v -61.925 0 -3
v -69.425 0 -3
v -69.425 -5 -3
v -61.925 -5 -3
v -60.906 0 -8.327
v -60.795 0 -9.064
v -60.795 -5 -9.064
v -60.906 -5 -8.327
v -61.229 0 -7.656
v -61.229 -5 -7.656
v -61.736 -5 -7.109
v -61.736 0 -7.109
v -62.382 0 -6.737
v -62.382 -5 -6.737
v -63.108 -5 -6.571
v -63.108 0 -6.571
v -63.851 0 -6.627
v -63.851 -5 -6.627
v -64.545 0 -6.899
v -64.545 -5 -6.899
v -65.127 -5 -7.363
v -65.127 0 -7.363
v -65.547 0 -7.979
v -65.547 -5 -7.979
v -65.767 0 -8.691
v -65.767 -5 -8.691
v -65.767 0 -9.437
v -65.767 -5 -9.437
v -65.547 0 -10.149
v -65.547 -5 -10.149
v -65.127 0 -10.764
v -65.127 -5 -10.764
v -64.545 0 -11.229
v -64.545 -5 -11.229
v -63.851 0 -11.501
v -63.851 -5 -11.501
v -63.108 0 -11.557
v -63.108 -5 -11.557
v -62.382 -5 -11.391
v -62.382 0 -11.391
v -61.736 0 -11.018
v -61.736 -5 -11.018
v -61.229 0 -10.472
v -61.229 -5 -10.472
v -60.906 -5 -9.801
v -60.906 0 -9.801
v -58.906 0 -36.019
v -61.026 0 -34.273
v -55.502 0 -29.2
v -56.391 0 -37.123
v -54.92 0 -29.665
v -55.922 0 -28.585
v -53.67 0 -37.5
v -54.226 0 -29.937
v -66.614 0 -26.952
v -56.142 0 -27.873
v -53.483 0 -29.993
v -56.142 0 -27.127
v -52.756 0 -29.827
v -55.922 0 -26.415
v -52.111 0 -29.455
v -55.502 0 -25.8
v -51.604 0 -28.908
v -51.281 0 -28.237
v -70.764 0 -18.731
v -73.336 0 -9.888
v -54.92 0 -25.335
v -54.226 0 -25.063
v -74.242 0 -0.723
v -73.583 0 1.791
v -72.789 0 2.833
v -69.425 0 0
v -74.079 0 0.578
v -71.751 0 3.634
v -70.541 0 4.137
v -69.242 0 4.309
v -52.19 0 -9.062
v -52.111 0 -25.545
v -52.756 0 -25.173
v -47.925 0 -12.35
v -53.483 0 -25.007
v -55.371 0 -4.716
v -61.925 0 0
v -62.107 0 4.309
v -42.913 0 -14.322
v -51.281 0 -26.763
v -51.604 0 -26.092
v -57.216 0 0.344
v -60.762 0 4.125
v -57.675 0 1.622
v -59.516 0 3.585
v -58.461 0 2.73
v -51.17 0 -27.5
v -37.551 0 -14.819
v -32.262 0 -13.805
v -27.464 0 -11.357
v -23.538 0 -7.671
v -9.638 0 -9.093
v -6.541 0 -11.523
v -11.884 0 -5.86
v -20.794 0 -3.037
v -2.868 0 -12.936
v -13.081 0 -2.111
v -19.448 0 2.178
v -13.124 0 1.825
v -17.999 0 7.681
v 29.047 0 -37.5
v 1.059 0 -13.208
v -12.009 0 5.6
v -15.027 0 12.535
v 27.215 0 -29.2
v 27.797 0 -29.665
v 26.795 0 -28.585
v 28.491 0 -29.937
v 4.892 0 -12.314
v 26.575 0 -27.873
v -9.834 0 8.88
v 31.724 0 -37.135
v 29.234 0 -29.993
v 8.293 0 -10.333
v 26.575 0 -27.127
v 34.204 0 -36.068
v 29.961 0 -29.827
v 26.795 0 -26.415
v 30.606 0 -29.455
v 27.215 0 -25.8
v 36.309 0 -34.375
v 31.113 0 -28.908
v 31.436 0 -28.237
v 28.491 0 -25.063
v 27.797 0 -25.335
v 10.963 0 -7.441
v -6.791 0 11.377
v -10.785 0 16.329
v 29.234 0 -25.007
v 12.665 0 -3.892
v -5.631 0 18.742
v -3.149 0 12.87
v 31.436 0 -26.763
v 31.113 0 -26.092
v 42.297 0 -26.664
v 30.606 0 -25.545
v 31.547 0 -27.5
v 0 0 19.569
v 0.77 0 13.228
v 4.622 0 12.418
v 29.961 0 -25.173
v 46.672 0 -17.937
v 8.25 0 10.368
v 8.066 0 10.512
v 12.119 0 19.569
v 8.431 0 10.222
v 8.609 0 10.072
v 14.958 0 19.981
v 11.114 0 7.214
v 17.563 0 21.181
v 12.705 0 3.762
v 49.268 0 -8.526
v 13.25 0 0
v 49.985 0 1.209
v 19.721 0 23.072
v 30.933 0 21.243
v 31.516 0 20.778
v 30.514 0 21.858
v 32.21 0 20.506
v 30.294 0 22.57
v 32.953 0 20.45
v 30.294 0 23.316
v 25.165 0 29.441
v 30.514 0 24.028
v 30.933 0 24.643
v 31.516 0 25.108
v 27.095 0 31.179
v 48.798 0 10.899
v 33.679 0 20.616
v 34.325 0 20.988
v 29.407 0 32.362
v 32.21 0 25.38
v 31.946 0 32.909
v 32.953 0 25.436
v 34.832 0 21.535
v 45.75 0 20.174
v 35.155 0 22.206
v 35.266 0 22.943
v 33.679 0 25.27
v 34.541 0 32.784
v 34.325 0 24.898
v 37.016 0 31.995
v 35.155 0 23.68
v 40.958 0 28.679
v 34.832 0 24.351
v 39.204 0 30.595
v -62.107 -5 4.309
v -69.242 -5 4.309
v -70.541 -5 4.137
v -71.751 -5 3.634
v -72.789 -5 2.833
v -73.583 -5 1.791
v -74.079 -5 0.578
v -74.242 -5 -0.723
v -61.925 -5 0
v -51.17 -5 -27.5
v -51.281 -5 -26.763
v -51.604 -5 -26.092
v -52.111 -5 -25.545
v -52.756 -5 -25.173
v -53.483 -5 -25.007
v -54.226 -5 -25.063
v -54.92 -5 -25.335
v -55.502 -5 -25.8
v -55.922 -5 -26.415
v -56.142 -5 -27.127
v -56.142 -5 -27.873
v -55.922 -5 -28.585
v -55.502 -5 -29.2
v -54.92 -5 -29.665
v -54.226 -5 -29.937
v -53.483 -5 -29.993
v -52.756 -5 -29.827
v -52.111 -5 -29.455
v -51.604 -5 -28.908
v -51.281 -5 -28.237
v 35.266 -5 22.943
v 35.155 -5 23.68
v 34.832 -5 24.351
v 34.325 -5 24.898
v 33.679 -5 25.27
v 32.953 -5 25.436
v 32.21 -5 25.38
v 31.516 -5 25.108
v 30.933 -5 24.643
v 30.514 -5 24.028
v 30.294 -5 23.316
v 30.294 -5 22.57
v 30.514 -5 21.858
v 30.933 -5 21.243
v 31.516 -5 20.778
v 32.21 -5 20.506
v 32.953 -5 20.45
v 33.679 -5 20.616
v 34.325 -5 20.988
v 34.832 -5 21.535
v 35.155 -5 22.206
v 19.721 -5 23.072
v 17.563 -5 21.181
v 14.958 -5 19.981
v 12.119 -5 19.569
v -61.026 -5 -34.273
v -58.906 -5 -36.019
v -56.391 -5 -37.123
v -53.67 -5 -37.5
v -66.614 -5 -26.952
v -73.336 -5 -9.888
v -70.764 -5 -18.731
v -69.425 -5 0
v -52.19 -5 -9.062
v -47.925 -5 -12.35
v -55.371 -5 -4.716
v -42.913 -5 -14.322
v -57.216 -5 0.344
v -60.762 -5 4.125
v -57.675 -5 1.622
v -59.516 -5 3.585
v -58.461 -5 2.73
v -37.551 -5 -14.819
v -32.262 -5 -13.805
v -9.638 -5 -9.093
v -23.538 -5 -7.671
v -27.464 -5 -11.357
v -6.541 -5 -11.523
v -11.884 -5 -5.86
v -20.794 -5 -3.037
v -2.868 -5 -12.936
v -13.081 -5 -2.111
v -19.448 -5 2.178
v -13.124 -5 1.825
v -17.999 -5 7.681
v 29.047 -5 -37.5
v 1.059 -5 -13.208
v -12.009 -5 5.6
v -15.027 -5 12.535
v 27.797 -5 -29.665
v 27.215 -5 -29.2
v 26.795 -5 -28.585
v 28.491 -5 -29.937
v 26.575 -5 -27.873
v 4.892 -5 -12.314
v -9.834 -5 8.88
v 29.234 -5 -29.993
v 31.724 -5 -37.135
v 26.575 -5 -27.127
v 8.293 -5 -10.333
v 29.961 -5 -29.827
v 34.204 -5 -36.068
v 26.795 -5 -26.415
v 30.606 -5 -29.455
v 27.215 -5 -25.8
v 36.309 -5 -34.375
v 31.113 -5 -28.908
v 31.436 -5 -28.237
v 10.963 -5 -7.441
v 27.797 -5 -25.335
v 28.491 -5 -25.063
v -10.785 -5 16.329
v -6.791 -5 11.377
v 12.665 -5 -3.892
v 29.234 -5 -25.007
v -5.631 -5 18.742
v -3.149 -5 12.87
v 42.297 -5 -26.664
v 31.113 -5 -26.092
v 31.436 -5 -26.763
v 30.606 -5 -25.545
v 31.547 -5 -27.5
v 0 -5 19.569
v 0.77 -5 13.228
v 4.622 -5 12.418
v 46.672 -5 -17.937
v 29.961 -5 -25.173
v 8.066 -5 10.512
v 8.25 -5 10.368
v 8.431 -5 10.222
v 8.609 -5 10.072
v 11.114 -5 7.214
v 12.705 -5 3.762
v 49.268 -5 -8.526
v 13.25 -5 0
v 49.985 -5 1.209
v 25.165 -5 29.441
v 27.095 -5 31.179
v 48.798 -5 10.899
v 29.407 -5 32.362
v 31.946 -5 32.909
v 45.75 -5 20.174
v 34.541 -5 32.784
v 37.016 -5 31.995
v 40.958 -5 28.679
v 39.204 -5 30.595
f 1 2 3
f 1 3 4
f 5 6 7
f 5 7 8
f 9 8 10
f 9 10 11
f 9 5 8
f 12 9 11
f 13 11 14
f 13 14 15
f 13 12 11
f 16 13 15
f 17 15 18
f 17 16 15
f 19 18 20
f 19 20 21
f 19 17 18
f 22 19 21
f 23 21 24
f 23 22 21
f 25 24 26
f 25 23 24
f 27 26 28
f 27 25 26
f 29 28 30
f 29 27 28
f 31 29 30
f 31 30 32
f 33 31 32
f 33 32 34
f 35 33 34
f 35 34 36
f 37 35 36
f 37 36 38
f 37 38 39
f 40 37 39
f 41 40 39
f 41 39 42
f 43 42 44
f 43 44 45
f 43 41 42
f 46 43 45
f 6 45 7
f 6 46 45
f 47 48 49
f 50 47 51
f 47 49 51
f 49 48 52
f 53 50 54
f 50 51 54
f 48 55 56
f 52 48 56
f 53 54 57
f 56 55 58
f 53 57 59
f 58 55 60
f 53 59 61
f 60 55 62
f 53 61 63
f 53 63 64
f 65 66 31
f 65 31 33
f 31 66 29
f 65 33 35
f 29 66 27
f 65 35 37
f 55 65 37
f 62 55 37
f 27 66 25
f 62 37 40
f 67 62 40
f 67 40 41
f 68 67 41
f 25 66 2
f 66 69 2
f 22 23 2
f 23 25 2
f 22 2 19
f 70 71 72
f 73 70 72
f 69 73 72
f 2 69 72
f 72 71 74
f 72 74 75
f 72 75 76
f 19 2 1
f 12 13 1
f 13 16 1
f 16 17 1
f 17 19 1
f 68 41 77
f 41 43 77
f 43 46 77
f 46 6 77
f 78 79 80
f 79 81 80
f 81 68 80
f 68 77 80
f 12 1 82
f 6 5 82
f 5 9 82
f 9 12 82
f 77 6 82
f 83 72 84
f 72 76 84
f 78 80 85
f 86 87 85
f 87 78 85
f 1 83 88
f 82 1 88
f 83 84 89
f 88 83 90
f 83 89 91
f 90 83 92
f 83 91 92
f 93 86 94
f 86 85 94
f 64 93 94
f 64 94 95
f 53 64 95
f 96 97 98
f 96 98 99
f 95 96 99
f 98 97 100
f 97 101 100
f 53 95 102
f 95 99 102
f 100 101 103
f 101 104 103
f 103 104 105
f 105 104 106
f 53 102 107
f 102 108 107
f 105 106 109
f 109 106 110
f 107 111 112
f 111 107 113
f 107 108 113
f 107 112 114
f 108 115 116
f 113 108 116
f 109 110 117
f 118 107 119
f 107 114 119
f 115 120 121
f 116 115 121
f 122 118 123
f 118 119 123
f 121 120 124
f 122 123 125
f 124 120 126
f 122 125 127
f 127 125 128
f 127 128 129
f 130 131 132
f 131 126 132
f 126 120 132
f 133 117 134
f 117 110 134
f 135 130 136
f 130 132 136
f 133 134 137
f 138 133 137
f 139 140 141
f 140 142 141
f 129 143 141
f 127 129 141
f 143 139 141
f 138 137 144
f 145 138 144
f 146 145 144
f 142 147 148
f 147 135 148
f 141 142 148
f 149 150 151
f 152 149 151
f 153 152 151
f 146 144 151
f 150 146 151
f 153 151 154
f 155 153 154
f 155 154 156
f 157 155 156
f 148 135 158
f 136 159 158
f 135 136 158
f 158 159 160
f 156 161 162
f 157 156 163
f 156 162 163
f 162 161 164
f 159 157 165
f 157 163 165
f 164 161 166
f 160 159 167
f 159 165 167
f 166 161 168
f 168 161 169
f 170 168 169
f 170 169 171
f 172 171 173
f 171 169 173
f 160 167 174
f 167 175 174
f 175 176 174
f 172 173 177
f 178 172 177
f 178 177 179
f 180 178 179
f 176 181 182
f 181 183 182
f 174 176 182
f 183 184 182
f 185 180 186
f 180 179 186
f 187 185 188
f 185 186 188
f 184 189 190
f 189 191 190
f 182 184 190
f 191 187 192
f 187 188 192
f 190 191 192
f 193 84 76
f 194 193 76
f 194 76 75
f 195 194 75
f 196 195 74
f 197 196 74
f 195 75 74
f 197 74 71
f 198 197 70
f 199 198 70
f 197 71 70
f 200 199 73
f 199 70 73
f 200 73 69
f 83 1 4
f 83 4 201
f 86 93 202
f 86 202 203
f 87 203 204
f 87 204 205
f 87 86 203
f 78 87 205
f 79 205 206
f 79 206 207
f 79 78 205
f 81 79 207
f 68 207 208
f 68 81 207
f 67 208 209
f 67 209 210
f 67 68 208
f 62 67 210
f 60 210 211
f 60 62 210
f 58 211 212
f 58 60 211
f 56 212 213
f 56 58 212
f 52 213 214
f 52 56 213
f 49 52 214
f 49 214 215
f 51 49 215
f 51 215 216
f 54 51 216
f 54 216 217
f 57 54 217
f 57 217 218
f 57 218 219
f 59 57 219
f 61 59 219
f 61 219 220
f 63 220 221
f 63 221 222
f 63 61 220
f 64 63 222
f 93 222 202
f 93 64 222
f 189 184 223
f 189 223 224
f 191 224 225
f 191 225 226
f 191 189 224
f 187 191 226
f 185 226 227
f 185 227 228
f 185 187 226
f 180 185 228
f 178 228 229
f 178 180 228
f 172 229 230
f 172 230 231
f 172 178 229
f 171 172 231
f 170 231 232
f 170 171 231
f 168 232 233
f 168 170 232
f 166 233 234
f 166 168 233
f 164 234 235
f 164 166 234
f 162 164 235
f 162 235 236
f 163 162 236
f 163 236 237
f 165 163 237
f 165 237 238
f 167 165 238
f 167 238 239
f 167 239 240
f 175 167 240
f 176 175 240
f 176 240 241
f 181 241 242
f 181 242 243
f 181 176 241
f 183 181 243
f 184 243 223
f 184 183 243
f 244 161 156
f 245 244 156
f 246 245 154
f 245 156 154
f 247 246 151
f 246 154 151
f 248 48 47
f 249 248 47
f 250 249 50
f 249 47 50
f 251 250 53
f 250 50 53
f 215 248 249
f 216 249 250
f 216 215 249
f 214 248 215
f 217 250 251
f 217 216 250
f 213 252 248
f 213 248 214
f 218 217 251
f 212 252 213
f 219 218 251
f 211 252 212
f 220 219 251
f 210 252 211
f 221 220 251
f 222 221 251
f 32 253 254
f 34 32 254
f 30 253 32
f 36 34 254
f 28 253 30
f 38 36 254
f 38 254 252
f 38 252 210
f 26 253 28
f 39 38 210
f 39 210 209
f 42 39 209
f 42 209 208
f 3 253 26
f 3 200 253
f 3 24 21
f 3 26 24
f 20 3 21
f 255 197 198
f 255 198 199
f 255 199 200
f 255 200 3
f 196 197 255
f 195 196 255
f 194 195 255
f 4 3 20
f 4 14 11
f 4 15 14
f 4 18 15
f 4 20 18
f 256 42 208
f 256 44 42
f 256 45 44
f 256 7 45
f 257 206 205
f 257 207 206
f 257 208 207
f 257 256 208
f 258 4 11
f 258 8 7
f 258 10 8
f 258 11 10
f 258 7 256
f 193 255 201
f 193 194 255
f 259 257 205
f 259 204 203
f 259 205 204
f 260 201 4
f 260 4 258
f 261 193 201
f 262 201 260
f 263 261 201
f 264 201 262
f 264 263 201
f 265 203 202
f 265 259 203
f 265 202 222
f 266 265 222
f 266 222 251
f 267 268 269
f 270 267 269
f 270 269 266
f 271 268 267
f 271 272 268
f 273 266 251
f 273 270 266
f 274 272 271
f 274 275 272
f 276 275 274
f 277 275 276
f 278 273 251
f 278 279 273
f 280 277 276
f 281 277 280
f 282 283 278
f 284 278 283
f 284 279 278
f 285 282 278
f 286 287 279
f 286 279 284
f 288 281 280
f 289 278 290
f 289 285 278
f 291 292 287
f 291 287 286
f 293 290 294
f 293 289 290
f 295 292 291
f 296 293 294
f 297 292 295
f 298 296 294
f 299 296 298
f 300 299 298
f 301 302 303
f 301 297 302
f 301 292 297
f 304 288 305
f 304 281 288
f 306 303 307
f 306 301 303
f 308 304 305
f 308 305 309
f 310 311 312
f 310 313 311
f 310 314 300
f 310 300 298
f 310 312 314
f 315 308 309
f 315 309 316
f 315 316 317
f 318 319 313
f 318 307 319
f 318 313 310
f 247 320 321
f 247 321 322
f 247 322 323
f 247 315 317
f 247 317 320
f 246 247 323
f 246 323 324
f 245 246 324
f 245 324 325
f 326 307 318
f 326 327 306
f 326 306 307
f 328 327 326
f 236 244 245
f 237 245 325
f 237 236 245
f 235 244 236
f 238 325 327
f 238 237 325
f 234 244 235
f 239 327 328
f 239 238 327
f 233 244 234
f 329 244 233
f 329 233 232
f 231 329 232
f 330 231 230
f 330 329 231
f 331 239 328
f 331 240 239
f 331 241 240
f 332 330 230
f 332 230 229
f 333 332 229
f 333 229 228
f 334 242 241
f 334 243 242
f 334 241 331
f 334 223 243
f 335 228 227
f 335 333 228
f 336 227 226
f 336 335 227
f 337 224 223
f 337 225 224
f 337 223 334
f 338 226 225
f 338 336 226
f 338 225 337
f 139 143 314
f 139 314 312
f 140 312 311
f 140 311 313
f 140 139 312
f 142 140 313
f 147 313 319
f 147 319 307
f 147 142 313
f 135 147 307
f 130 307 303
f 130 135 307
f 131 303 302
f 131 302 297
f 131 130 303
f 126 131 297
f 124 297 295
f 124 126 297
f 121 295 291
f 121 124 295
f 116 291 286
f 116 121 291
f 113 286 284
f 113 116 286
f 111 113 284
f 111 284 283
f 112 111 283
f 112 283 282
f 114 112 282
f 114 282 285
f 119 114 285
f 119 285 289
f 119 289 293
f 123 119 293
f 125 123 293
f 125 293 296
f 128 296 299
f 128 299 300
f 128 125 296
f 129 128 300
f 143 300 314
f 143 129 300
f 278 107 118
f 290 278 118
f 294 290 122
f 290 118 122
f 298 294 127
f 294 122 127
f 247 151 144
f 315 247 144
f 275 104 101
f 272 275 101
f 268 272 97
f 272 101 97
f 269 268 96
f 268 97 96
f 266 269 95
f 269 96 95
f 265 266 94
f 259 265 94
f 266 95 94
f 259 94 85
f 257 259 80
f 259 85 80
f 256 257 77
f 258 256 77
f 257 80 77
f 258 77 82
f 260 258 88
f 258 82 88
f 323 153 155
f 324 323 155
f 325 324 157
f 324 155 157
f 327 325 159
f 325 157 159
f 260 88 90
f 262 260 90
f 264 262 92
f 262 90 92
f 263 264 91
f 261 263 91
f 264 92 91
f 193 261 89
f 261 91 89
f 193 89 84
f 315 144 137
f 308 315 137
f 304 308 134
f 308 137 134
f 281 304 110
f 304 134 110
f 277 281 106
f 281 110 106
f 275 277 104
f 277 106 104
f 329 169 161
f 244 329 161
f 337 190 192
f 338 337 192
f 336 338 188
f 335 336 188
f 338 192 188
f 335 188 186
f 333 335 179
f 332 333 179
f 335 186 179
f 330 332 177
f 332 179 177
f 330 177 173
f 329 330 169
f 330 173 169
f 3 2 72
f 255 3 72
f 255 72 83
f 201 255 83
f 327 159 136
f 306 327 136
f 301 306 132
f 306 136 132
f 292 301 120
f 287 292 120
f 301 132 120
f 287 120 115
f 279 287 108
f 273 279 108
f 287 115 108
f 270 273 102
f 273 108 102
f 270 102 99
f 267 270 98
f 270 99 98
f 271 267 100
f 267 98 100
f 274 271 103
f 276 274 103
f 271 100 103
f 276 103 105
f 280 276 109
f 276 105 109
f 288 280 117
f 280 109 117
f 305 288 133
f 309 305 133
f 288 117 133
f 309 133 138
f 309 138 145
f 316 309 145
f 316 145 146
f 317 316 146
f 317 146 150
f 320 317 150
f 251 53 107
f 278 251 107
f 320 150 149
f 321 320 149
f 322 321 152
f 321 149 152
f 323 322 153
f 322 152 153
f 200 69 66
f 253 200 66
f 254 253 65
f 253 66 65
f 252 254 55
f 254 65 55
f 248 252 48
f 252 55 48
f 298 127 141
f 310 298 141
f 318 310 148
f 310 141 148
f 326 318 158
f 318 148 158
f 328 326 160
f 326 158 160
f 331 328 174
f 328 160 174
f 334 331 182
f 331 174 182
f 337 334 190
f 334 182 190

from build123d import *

# Parameters (mm, degrees)
F0_R     = 2.5
F0_W     = 7.5
F0_H     = 3
F1_DEPTH = 5


with BuildPart() as f1:
    # F0 (on Front) → F1 (new body)
    with BuildSketch(Plane.XZ):
        with BuildLine():
            Line((-53.669743, -37.5), (29.047375, -37.5))
            ThreePointArc((29.047375, -37.5), (33.000222, -36.685587), (36.309219, -34.375))
            ThreePointArc((36.309219, -34.375), (49.864682, -3.676068), (40.957602, 28.678822))
            ThreePointArc((40.957602, 28.678822), (33.247823, 32.931447), (25.164572, 29.440522))
            Line((25.164572, 29.440522), (19.7208, 23.071748))
            ThreePointArc((19.7208, 23.071748), (16.304105, 20.486959), (12.11929, 19.569212))
            Line((12.11929, 19.569212), (0, 19.569212))
            ThreePointArc((0, 19.569212), (-13.044872, 14.587166), (-19.447661, 2.177743))
            ThreePointArc((-19.447661, 2.177743), (-37.550938, -14.819453), (-57.215631, 0.344095))
            ThreePointArc((-57.215631, 0.344095), (-58.958953, 3.193251), (-62.107302, 4.308938))
            Line((-62.107302, 4.308938), (-69.242118, 4.308938))
            ThreePointArc((-69.242118, 4.308938), (-72.788821, 2.833268), (-74.242018, -0.722701))
            ThreePointArc((-74.242018, -0.722701), (-70.76408, -18.73091), (-61.026424, -34.273422))
            ThreePointArc((-61.026424, -34.273422), (-57.68632, -36.657899), (-53.669743, -37.5))
        make_face()
        with Locations((-53.669743, -27.5)):
            Circle(F0_R, mode=Mode.SUBTRACT)
        with Locations((-63.29486, -9.063897)):
            Circle(F0_R, mode=Mode.SUBTRACT)
        with Locations((29.047375, -27.5)):
            Circle(F0_R, mode=Mode.SUBTRACT)
        with Locations((-65.67471, -1.5)):
            Rectangle(F0_W, F0_H, mode=Mode.SUBTRACT)
        with BuildLine():
            ThreePointArc((8.60914, 10.072001), (12.033985, 5.54488), (13.25, 0))
            ThreePointArc((13.25, 0), (-11.883564, -5.860325), (8.066089, 10.511932))
            ThreePointArc((8.066089, 10.511932), (8.340516, 10.295547), (8.60914, 10.072001))
        make_face(mode=Mode.SUBTRACT)
        with Locations((32.766082, 22.943057)):
            Circle(F0_R, mode=Mode.SUBTRACT)
    extrude(amount=F1_DEPTH)


solid = f1.part
